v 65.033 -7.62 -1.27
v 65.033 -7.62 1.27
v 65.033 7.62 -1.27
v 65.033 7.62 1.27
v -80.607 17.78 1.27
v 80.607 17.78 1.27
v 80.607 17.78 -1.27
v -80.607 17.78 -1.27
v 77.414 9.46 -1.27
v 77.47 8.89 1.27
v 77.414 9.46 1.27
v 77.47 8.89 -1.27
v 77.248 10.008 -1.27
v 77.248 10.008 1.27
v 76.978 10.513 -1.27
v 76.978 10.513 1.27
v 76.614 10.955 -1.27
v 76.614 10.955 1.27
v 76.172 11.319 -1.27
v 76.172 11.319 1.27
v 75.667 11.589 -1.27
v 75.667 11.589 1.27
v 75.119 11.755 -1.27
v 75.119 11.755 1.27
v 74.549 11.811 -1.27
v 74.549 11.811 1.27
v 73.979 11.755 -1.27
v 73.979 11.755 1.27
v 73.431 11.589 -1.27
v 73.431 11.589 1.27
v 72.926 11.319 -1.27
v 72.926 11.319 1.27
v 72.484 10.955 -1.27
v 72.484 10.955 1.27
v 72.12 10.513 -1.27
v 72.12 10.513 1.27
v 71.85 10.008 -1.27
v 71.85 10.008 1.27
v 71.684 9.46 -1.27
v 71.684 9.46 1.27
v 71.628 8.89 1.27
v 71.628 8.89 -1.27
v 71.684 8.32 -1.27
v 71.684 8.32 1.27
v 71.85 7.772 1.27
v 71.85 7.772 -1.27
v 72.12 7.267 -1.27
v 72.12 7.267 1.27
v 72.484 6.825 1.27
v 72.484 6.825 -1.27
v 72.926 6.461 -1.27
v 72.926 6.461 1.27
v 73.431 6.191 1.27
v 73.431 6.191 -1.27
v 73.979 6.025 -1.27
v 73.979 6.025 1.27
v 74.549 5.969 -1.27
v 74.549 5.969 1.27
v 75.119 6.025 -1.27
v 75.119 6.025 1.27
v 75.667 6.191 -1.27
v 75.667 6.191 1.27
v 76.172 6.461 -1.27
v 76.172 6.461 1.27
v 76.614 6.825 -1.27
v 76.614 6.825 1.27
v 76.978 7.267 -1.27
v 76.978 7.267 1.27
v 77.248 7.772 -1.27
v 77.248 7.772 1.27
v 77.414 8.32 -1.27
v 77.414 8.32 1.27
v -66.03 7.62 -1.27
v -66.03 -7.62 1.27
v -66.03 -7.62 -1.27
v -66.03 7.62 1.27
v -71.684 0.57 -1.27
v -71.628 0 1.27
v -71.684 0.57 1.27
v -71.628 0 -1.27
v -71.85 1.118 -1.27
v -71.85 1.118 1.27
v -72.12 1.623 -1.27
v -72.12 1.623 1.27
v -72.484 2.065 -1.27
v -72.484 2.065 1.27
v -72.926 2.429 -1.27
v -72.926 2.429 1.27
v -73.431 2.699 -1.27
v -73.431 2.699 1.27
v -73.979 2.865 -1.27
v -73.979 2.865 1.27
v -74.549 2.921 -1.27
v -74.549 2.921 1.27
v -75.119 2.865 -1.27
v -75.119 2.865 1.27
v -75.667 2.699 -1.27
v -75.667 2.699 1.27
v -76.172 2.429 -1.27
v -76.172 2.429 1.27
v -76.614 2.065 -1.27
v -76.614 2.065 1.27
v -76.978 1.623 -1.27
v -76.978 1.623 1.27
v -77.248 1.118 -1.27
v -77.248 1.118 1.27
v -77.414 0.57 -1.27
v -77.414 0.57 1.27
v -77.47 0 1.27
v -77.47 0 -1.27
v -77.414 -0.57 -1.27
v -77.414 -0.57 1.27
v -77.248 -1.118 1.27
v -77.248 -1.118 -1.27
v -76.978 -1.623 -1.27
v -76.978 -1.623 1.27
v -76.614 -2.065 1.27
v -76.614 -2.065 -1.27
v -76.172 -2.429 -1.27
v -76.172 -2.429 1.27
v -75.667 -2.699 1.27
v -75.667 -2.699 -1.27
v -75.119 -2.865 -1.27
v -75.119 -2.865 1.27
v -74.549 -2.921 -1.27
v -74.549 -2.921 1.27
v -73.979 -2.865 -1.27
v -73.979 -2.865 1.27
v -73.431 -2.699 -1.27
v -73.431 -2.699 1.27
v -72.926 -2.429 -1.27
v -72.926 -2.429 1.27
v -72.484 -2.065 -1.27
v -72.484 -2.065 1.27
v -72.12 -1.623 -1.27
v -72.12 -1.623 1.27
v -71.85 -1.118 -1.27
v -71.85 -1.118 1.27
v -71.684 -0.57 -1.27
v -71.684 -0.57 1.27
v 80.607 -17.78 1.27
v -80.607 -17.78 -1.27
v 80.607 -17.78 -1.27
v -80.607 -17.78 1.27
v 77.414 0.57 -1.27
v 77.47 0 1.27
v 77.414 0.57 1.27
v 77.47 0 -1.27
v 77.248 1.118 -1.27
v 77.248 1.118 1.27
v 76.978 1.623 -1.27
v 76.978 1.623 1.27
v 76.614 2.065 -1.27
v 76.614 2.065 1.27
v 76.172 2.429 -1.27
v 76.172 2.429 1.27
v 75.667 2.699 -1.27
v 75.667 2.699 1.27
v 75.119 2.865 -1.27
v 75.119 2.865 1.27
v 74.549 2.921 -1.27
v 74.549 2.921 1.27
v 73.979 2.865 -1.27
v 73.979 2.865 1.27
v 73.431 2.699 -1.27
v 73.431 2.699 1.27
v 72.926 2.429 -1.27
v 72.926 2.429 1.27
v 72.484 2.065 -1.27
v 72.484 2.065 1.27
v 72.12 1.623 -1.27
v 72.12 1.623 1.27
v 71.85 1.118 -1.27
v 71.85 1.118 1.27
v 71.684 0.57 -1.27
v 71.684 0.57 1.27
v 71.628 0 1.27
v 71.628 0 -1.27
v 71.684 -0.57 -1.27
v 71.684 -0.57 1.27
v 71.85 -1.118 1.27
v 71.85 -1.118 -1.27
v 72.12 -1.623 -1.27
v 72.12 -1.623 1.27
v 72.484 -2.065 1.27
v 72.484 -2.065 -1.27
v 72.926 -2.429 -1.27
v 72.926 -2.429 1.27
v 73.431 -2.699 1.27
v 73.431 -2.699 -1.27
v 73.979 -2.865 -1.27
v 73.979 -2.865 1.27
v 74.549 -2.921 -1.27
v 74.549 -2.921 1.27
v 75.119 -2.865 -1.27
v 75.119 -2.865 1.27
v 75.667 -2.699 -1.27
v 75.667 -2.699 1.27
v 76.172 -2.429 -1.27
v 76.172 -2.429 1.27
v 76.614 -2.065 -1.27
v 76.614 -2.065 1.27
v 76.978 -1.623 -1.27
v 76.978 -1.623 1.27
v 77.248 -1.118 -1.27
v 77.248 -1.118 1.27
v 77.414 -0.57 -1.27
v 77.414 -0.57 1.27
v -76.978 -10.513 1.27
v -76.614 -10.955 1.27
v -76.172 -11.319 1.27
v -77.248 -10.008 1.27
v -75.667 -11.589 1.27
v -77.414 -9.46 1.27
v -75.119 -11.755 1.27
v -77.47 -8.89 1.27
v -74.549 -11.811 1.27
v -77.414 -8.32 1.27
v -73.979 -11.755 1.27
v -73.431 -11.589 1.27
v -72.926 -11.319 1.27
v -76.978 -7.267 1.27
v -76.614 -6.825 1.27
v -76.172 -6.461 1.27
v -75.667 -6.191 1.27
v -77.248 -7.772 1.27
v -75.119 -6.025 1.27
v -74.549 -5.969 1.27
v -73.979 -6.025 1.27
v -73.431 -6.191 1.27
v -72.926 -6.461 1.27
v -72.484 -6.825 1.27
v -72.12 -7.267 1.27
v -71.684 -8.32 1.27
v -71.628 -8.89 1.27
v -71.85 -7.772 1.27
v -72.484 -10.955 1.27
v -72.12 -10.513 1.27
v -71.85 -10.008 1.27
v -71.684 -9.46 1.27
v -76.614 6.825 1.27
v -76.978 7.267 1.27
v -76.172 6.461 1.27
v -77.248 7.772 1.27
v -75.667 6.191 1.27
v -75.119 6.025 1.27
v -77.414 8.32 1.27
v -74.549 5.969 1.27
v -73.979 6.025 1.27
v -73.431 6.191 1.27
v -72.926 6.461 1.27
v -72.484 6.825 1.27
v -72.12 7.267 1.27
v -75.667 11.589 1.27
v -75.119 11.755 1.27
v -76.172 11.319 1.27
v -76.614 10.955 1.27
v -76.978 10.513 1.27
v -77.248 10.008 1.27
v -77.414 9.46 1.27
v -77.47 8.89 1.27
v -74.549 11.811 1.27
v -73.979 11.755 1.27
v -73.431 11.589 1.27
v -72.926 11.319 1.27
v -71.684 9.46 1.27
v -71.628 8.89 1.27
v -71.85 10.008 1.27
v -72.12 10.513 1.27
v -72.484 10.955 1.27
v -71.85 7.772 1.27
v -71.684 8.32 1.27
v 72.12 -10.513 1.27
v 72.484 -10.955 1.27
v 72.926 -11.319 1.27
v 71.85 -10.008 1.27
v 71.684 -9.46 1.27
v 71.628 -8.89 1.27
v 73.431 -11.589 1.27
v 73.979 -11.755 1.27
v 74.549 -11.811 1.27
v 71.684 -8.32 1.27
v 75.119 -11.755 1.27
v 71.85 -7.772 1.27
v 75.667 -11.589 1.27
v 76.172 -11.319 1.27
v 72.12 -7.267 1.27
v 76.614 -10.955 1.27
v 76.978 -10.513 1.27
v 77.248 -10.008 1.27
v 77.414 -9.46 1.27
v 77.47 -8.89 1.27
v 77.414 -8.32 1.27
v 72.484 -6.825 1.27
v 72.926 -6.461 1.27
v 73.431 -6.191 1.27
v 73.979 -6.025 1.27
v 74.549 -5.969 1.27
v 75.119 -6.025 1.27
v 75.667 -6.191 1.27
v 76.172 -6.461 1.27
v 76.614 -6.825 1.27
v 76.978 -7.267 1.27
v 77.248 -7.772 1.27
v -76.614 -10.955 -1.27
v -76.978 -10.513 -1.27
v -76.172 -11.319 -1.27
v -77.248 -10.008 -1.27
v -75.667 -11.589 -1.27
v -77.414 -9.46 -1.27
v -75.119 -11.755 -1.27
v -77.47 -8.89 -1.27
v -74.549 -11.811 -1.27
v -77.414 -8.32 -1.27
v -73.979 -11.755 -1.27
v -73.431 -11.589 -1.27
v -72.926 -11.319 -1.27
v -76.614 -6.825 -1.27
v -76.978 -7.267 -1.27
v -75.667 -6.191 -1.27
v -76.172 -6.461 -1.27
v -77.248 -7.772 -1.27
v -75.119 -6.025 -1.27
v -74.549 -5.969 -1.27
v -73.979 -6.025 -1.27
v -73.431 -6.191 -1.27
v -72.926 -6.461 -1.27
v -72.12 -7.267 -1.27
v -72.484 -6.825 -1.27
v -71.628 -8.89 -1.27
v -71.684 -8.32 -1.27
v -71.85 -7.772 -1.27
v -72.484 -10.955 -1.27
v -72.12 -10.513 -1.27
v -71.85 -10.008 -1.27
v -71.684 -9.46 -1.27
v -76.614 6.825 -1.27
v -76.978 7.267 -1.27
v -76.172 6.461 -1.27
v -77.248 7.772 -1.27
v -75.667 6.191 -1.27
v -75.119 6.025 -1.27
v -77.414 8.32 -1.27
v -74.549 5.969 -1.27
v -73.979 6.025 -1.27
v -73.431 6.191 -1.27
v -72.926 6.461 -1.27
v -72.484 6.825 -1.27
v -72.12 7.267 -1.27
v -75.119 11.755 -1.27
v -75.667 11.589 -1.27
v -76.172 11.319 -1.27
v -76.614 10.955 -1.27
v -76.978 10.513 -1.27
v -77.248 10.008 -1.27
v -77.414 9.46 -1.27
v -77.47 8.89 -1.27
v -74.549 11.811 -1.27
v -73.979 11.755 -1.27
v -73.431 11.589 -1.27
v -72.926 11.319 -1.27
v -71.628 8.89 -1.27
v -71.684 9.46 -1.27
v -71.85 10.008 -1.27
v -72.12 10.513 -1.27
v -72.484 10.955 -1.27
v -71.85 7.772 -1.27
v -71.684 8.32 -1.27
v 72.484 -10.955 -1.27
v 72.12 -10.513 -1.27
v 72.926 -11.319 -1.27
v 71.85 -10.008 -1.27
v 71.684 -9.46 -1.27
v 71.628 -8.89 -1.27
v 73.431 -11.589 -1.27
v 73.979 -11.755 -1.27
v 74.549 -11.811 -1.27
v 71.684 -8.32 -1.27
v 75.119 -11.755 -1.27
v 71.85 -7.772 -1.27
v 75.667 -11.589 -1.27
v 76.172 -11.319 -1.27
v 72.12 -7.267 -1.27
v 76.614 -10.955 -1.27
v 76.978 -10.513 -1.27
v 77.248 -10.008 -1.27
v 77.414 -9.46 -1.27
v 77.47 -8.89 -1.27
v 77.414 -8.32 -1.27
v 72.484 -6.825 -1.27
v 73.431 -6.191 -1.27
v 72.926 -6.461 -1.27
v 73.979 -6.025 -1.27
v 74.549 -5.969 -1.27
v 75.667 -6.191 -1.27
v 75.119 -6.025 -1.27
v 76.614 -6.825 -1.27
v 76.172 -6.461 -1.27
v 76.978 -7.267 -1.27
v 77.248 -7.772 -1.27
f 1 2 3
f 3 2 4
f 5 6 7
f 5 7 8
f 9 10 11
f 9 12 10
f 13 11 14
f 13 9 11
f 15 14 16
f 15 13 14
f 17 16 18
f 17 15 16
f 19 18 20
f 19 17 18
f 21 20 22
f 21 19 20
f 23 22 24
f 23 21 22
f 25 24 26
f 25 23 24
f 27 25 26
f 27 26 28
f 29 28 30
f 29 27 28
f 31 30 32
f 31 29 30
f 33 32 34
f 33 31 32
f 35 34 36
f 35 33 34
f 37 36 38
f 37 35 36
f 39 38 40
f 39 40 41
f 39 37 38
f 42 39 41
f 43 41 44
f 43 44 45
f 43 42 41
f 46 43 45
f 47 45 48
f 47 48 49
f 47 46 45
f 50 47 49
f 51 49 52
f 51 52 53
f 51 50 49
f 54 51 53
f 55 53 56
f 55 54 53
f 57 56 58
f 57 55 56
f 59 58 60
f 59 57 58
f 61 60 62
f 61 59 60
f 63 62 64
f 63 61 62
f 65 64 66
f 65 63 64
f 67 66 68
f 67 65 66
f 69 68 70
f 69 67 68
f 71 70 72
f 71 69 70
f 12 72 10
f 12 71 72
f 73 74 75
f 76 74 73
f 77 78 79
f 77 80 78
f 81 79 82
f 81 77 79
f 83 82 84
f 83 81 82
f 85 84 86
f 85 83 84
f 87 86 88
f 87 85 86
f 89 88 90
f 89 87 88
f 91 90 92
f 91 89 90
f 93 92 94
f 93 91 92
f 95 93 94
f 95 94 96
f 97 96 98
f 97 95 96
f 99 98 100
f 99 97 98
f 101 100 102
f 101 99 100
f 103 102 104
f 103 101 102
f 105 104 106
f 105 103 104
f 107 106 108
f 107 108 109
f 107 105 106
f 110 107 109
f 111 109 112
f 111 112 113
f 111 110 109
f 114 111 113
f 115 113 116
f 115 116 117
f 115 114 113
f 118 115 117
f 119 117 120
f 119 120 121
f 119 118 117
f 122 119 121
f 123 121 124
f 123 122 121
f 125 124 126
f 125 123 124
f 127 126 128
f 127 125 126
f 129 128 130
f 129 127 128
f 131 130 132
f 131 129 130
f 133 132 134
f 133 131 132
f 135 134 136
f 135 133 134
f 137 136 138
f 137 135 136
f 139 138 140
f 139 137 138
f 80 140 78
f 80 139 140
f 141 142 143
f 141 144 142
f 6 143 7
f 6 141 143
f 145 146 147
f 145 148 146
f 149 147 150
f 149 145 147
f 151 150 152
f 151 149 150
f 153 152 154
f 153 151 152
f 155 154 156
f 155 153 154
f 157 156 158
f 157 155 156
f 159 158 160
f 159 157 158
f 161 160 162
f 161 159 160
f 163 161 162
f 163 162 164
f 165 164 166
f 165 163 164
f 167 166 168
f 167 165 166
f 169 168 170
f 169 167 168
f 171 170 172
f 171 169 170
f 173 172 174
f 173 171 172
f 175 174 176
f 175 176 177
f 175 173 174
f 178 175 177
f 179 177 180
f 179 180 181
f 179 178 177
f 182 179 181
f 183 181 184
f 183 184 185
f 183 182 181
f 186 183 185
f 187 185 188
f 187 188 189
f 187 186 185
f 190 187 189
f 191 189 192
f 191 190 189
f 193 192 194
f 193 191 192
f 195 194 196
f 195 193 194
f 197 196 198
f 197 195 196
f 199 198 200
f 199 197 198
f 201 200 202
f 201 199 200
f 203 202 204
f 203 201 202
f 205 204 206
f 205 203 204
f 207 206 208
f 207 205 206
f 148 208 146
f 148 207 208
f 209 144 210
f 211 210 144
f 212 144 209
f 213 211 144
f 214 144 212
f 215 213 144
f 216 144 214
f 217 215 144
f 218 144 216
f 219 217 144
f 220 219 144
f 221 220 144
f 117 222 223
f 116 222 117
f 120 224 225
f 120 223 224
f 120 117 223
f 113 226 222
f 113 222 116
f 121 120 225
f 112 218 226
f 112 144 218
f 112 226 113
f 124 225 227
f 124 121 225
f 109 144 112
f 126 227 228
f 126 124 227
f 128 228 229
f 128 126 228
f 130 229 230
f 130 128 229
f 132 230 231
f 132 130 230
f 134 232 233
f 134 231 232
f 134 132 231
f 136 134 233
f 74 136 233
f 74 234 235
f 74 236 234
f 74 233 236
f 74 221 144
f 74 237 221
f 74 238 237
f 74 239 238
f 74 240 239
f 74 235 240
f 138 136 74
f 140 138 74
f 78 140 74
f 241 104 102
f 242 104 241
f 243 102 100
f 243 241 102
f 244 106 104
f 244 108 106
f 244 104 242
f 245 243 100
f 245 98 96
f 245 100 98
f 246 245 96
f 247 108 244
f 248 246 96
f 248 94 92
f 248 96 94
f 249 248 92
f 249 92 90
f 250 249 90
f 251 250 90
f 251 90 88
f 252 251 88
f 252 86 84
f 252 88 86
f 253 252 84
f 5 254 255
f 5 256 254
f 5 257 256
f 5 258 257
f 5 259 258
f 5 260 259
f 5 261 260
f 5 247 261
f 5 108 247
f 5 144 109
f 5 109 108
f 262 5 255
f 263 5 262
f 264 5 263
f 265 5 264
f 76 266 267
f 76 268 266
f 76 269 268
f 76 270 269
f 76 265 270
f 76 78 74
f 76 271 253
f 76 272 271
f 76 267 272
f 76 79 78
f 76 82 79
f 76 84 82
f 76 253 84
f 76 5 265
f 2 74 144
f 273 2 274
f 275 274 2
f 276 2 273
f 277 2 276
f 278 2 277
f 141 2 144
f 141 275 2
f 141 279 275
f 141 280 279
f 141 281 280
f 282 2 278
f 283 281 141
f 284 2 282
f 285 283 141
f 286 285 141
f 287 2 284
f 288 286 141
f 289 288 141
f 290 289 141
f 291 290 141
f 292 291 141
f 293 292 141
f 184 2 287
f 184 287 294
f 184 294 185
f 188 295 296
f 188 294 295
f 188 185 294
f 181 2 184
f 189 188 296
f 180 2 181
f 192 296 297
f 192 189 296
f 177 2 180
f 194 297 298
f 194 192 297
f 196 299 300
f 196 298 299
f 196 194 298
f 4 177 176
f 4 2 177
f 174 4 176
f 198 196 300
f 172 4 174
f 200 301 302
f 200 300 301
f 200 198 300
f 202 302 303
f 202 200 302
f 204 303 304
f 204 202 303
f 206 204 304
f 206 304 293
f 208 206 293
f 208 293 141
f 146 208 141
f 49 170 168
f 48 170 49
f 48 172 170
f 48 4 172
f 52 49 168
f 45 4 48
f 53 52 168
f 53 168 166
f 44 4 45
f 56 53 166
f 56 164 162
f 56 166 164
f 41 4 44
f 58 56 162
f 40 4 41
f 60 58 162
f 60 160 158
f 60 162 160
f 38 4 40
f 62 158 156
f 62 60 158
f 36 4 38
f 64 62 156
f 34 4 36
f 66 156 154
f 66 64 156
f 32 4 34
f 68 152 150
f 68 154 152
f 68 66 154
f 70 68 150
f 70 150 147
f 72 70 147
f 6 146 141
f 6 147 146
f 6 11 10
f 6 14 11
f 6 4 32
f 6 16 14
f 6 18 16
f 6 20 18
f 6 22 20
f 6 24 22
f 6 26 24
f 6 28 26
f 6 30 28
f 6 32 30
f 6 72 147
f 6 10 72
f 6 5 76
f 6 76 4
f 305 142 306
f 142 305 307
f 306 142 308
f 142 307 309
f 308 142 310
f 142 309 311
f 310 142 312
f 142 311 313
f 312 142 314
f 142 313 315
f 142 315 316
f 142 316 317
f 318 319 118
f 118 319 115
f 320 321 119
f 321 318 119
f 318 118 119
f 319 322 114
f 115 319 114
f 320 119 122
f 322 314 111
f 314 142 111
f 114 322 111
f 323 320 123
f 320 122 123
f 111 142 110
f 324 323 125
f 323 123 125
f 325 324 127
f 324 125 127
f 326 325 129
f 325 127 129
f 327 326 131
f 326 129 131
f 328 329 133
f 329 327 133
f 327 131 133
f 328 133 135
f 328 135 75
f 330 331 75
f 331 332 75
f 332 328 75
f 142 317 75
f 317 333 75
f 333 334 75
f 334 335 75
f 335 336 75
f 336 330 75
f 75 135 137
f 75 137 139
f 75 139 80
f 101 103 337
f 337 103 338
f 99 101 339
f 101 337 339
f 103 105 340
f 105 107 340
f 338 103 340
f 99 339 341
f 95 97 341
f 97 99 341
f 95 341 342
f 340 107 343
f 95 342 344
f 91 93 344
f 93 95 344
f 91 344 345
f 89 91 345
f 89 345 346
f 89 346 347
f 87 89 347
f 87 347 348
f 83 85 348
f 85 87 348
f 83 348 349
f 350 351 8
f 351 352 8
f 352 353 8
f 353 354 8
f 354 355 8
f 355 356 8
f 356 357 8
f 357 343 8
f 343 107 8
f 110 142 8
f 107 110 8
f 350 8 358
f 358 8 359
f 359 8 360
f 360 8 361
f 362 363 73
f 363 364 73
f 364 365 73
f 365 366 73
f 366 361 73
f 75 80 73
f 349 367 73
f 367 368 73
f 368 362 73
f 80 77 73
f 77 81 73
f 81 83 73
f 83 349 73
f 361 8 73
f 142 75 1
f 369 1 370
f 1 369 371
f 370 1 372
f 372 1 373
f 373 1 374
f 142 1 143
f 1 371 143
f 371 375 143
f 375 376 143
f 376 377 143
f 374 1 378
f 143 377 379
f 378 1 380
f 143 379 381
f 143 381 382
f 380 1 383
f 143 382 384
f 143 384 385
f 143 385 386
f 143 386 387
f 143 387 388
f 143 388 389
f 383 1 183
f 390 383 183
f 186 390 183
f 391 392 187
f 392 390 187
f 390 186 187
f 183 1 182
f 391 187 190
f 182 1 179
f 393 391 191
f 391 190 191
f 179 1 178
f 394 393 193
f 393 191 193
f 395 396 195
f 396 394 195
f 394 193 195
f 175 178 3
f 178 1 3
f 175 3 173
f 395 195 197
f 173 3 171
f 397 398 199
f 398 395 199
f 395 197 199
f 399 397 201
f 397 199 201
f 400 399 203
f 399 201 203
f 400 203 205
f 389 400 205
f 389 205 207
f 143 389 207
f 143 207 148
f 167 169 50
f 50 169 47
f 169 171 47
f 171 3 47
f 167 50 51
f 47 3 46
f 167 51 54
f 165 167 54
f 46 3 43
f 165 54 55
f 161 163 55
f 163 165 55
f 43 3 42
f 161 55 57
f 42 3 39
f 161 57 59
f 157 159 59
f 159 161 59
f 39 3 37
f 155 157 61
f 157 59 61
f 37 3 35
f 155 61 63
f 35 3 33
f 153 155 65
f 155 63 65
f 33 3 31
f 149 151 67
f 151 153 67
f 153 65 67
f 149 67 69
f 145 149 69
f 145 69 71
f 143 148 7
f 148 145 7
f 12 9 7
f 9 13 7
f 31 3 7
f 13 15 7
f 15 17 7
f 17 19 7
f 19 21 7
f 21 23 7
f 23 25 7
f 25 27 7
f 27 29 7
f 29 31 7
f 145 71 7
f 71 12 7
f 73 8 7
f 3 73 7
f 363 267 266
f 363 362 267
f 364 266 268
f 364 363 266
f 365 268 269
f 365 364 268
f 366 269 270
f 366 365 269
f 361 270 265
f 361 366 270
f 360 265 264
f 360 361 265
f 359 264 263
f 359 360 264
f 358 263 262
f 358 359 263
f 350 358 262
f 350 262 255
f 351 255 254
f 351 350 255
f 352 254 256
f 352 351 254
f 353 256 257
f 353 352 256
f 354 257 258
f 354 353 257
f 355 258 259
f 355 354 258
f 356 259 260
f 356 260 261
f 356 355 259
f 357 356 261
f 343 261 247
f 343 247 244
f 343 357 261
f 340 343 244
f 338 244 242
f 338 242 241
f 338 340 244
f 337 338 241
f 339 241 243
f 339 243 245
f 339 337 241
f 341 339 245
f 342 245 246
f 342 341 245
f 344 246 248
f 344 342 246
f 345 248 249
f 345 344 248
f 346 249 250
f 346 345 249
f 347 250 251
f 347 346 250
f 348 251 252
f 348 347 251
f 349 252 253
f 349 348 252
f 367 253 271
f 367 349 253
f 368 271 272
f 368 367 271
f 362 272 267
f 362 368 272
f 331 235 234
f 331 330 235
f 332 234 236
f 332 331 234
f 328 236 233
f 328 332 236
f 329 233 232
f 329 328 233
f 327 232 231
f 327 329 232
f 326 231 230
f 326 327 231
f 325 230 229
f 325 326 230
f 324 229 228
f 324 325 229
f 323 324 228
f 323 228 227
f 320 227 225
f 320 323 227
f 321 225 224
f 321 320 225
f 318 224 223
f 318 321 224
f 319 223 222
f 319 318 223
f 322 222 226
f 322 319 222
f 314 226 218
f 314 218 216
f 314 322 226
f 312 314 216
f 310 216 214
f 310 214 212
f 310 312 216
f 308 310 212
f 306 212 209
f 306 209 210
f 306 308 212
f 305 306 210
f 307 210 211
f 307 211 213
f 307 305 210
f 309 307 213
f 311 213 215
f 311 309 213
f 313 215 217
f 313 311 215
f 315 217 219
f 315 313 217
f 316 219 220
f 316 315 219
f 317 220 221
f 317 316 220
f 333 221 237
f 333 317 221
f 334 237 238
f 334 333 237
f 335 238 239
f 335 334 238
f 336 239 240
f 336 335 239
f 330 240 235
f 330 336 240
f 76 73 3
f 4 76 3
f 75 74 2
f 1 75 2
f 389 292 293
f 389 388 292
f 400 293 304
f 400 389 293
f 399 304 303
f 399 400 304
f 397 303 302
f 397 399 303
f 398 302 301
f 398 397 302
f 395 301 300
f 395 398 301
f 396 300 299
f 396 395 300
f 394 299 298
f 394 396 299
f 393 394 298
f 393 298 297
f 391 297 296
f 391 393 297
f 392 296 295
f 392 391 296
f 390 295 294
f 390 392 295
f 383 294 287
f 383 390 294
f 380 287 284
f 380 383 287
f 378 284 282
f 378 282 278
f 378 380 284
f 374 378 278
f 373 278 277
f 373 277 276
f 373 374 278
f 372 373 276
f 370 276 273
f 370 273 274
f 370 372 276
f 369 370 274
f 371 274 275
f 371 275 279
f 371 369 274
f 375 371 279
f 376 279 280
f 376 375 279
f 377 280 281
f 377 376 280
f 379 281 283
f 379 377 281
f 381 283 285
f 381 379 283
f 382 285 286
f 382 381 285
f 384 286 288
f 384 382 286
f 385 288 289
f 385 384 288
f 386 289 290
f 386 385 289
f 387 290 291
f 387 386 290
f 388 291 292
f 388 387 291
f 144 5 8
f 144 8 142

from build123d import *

# Parameters (mm, degrees)
F0_R     = 2.921
F0_W     = 131.063283
F0_H     = 15.24
F1_DEPTH = 1.27


with BuildPart() as f1:
    # F0 (on Top) → F1 (new body, symmetric)
    with BuildSketch(Plane.XY):
        Polygon((80.6069, -17.78), (80.6069, 17.78), (68.4911, 17.78), (-68.4911, 17.78), (-80.6069, 17.78), (-80.6069, -17.78), (-68.4911, -17.78), (68.4911, -17.78), align=None)
        with Locations((-74.549, -8.89)):
            Circle(F0_R, mode=Mode.SUBTRACT)
        with Locations((-74.549, 0)):
            Circle(F0_R, mode=Mode.SUBTRACT)
        with Locations((-0.498816, 0)):
            Rectangle(F0_W, F0_H, mode=Mode.SUBTRACT)
        with Locations((74.549, -8.89)):
            Circle(F0_R, mode=Mode.SUBTRACT)
        with Locations((74.549, 0)):
            Circle(F0_R, mode=Mode.SUBTRACT)
        with Locations((-74.549, 8.89)):
            Circle(F0_R, mode=Mode.SUBTRACT)
        with Locations((74.549, 8.89)):
            Circle(F0_R, mode=Mode.SUBTRACT)
    extrude(amount=F1_DEPTH, both=True)


solid = f1.part
